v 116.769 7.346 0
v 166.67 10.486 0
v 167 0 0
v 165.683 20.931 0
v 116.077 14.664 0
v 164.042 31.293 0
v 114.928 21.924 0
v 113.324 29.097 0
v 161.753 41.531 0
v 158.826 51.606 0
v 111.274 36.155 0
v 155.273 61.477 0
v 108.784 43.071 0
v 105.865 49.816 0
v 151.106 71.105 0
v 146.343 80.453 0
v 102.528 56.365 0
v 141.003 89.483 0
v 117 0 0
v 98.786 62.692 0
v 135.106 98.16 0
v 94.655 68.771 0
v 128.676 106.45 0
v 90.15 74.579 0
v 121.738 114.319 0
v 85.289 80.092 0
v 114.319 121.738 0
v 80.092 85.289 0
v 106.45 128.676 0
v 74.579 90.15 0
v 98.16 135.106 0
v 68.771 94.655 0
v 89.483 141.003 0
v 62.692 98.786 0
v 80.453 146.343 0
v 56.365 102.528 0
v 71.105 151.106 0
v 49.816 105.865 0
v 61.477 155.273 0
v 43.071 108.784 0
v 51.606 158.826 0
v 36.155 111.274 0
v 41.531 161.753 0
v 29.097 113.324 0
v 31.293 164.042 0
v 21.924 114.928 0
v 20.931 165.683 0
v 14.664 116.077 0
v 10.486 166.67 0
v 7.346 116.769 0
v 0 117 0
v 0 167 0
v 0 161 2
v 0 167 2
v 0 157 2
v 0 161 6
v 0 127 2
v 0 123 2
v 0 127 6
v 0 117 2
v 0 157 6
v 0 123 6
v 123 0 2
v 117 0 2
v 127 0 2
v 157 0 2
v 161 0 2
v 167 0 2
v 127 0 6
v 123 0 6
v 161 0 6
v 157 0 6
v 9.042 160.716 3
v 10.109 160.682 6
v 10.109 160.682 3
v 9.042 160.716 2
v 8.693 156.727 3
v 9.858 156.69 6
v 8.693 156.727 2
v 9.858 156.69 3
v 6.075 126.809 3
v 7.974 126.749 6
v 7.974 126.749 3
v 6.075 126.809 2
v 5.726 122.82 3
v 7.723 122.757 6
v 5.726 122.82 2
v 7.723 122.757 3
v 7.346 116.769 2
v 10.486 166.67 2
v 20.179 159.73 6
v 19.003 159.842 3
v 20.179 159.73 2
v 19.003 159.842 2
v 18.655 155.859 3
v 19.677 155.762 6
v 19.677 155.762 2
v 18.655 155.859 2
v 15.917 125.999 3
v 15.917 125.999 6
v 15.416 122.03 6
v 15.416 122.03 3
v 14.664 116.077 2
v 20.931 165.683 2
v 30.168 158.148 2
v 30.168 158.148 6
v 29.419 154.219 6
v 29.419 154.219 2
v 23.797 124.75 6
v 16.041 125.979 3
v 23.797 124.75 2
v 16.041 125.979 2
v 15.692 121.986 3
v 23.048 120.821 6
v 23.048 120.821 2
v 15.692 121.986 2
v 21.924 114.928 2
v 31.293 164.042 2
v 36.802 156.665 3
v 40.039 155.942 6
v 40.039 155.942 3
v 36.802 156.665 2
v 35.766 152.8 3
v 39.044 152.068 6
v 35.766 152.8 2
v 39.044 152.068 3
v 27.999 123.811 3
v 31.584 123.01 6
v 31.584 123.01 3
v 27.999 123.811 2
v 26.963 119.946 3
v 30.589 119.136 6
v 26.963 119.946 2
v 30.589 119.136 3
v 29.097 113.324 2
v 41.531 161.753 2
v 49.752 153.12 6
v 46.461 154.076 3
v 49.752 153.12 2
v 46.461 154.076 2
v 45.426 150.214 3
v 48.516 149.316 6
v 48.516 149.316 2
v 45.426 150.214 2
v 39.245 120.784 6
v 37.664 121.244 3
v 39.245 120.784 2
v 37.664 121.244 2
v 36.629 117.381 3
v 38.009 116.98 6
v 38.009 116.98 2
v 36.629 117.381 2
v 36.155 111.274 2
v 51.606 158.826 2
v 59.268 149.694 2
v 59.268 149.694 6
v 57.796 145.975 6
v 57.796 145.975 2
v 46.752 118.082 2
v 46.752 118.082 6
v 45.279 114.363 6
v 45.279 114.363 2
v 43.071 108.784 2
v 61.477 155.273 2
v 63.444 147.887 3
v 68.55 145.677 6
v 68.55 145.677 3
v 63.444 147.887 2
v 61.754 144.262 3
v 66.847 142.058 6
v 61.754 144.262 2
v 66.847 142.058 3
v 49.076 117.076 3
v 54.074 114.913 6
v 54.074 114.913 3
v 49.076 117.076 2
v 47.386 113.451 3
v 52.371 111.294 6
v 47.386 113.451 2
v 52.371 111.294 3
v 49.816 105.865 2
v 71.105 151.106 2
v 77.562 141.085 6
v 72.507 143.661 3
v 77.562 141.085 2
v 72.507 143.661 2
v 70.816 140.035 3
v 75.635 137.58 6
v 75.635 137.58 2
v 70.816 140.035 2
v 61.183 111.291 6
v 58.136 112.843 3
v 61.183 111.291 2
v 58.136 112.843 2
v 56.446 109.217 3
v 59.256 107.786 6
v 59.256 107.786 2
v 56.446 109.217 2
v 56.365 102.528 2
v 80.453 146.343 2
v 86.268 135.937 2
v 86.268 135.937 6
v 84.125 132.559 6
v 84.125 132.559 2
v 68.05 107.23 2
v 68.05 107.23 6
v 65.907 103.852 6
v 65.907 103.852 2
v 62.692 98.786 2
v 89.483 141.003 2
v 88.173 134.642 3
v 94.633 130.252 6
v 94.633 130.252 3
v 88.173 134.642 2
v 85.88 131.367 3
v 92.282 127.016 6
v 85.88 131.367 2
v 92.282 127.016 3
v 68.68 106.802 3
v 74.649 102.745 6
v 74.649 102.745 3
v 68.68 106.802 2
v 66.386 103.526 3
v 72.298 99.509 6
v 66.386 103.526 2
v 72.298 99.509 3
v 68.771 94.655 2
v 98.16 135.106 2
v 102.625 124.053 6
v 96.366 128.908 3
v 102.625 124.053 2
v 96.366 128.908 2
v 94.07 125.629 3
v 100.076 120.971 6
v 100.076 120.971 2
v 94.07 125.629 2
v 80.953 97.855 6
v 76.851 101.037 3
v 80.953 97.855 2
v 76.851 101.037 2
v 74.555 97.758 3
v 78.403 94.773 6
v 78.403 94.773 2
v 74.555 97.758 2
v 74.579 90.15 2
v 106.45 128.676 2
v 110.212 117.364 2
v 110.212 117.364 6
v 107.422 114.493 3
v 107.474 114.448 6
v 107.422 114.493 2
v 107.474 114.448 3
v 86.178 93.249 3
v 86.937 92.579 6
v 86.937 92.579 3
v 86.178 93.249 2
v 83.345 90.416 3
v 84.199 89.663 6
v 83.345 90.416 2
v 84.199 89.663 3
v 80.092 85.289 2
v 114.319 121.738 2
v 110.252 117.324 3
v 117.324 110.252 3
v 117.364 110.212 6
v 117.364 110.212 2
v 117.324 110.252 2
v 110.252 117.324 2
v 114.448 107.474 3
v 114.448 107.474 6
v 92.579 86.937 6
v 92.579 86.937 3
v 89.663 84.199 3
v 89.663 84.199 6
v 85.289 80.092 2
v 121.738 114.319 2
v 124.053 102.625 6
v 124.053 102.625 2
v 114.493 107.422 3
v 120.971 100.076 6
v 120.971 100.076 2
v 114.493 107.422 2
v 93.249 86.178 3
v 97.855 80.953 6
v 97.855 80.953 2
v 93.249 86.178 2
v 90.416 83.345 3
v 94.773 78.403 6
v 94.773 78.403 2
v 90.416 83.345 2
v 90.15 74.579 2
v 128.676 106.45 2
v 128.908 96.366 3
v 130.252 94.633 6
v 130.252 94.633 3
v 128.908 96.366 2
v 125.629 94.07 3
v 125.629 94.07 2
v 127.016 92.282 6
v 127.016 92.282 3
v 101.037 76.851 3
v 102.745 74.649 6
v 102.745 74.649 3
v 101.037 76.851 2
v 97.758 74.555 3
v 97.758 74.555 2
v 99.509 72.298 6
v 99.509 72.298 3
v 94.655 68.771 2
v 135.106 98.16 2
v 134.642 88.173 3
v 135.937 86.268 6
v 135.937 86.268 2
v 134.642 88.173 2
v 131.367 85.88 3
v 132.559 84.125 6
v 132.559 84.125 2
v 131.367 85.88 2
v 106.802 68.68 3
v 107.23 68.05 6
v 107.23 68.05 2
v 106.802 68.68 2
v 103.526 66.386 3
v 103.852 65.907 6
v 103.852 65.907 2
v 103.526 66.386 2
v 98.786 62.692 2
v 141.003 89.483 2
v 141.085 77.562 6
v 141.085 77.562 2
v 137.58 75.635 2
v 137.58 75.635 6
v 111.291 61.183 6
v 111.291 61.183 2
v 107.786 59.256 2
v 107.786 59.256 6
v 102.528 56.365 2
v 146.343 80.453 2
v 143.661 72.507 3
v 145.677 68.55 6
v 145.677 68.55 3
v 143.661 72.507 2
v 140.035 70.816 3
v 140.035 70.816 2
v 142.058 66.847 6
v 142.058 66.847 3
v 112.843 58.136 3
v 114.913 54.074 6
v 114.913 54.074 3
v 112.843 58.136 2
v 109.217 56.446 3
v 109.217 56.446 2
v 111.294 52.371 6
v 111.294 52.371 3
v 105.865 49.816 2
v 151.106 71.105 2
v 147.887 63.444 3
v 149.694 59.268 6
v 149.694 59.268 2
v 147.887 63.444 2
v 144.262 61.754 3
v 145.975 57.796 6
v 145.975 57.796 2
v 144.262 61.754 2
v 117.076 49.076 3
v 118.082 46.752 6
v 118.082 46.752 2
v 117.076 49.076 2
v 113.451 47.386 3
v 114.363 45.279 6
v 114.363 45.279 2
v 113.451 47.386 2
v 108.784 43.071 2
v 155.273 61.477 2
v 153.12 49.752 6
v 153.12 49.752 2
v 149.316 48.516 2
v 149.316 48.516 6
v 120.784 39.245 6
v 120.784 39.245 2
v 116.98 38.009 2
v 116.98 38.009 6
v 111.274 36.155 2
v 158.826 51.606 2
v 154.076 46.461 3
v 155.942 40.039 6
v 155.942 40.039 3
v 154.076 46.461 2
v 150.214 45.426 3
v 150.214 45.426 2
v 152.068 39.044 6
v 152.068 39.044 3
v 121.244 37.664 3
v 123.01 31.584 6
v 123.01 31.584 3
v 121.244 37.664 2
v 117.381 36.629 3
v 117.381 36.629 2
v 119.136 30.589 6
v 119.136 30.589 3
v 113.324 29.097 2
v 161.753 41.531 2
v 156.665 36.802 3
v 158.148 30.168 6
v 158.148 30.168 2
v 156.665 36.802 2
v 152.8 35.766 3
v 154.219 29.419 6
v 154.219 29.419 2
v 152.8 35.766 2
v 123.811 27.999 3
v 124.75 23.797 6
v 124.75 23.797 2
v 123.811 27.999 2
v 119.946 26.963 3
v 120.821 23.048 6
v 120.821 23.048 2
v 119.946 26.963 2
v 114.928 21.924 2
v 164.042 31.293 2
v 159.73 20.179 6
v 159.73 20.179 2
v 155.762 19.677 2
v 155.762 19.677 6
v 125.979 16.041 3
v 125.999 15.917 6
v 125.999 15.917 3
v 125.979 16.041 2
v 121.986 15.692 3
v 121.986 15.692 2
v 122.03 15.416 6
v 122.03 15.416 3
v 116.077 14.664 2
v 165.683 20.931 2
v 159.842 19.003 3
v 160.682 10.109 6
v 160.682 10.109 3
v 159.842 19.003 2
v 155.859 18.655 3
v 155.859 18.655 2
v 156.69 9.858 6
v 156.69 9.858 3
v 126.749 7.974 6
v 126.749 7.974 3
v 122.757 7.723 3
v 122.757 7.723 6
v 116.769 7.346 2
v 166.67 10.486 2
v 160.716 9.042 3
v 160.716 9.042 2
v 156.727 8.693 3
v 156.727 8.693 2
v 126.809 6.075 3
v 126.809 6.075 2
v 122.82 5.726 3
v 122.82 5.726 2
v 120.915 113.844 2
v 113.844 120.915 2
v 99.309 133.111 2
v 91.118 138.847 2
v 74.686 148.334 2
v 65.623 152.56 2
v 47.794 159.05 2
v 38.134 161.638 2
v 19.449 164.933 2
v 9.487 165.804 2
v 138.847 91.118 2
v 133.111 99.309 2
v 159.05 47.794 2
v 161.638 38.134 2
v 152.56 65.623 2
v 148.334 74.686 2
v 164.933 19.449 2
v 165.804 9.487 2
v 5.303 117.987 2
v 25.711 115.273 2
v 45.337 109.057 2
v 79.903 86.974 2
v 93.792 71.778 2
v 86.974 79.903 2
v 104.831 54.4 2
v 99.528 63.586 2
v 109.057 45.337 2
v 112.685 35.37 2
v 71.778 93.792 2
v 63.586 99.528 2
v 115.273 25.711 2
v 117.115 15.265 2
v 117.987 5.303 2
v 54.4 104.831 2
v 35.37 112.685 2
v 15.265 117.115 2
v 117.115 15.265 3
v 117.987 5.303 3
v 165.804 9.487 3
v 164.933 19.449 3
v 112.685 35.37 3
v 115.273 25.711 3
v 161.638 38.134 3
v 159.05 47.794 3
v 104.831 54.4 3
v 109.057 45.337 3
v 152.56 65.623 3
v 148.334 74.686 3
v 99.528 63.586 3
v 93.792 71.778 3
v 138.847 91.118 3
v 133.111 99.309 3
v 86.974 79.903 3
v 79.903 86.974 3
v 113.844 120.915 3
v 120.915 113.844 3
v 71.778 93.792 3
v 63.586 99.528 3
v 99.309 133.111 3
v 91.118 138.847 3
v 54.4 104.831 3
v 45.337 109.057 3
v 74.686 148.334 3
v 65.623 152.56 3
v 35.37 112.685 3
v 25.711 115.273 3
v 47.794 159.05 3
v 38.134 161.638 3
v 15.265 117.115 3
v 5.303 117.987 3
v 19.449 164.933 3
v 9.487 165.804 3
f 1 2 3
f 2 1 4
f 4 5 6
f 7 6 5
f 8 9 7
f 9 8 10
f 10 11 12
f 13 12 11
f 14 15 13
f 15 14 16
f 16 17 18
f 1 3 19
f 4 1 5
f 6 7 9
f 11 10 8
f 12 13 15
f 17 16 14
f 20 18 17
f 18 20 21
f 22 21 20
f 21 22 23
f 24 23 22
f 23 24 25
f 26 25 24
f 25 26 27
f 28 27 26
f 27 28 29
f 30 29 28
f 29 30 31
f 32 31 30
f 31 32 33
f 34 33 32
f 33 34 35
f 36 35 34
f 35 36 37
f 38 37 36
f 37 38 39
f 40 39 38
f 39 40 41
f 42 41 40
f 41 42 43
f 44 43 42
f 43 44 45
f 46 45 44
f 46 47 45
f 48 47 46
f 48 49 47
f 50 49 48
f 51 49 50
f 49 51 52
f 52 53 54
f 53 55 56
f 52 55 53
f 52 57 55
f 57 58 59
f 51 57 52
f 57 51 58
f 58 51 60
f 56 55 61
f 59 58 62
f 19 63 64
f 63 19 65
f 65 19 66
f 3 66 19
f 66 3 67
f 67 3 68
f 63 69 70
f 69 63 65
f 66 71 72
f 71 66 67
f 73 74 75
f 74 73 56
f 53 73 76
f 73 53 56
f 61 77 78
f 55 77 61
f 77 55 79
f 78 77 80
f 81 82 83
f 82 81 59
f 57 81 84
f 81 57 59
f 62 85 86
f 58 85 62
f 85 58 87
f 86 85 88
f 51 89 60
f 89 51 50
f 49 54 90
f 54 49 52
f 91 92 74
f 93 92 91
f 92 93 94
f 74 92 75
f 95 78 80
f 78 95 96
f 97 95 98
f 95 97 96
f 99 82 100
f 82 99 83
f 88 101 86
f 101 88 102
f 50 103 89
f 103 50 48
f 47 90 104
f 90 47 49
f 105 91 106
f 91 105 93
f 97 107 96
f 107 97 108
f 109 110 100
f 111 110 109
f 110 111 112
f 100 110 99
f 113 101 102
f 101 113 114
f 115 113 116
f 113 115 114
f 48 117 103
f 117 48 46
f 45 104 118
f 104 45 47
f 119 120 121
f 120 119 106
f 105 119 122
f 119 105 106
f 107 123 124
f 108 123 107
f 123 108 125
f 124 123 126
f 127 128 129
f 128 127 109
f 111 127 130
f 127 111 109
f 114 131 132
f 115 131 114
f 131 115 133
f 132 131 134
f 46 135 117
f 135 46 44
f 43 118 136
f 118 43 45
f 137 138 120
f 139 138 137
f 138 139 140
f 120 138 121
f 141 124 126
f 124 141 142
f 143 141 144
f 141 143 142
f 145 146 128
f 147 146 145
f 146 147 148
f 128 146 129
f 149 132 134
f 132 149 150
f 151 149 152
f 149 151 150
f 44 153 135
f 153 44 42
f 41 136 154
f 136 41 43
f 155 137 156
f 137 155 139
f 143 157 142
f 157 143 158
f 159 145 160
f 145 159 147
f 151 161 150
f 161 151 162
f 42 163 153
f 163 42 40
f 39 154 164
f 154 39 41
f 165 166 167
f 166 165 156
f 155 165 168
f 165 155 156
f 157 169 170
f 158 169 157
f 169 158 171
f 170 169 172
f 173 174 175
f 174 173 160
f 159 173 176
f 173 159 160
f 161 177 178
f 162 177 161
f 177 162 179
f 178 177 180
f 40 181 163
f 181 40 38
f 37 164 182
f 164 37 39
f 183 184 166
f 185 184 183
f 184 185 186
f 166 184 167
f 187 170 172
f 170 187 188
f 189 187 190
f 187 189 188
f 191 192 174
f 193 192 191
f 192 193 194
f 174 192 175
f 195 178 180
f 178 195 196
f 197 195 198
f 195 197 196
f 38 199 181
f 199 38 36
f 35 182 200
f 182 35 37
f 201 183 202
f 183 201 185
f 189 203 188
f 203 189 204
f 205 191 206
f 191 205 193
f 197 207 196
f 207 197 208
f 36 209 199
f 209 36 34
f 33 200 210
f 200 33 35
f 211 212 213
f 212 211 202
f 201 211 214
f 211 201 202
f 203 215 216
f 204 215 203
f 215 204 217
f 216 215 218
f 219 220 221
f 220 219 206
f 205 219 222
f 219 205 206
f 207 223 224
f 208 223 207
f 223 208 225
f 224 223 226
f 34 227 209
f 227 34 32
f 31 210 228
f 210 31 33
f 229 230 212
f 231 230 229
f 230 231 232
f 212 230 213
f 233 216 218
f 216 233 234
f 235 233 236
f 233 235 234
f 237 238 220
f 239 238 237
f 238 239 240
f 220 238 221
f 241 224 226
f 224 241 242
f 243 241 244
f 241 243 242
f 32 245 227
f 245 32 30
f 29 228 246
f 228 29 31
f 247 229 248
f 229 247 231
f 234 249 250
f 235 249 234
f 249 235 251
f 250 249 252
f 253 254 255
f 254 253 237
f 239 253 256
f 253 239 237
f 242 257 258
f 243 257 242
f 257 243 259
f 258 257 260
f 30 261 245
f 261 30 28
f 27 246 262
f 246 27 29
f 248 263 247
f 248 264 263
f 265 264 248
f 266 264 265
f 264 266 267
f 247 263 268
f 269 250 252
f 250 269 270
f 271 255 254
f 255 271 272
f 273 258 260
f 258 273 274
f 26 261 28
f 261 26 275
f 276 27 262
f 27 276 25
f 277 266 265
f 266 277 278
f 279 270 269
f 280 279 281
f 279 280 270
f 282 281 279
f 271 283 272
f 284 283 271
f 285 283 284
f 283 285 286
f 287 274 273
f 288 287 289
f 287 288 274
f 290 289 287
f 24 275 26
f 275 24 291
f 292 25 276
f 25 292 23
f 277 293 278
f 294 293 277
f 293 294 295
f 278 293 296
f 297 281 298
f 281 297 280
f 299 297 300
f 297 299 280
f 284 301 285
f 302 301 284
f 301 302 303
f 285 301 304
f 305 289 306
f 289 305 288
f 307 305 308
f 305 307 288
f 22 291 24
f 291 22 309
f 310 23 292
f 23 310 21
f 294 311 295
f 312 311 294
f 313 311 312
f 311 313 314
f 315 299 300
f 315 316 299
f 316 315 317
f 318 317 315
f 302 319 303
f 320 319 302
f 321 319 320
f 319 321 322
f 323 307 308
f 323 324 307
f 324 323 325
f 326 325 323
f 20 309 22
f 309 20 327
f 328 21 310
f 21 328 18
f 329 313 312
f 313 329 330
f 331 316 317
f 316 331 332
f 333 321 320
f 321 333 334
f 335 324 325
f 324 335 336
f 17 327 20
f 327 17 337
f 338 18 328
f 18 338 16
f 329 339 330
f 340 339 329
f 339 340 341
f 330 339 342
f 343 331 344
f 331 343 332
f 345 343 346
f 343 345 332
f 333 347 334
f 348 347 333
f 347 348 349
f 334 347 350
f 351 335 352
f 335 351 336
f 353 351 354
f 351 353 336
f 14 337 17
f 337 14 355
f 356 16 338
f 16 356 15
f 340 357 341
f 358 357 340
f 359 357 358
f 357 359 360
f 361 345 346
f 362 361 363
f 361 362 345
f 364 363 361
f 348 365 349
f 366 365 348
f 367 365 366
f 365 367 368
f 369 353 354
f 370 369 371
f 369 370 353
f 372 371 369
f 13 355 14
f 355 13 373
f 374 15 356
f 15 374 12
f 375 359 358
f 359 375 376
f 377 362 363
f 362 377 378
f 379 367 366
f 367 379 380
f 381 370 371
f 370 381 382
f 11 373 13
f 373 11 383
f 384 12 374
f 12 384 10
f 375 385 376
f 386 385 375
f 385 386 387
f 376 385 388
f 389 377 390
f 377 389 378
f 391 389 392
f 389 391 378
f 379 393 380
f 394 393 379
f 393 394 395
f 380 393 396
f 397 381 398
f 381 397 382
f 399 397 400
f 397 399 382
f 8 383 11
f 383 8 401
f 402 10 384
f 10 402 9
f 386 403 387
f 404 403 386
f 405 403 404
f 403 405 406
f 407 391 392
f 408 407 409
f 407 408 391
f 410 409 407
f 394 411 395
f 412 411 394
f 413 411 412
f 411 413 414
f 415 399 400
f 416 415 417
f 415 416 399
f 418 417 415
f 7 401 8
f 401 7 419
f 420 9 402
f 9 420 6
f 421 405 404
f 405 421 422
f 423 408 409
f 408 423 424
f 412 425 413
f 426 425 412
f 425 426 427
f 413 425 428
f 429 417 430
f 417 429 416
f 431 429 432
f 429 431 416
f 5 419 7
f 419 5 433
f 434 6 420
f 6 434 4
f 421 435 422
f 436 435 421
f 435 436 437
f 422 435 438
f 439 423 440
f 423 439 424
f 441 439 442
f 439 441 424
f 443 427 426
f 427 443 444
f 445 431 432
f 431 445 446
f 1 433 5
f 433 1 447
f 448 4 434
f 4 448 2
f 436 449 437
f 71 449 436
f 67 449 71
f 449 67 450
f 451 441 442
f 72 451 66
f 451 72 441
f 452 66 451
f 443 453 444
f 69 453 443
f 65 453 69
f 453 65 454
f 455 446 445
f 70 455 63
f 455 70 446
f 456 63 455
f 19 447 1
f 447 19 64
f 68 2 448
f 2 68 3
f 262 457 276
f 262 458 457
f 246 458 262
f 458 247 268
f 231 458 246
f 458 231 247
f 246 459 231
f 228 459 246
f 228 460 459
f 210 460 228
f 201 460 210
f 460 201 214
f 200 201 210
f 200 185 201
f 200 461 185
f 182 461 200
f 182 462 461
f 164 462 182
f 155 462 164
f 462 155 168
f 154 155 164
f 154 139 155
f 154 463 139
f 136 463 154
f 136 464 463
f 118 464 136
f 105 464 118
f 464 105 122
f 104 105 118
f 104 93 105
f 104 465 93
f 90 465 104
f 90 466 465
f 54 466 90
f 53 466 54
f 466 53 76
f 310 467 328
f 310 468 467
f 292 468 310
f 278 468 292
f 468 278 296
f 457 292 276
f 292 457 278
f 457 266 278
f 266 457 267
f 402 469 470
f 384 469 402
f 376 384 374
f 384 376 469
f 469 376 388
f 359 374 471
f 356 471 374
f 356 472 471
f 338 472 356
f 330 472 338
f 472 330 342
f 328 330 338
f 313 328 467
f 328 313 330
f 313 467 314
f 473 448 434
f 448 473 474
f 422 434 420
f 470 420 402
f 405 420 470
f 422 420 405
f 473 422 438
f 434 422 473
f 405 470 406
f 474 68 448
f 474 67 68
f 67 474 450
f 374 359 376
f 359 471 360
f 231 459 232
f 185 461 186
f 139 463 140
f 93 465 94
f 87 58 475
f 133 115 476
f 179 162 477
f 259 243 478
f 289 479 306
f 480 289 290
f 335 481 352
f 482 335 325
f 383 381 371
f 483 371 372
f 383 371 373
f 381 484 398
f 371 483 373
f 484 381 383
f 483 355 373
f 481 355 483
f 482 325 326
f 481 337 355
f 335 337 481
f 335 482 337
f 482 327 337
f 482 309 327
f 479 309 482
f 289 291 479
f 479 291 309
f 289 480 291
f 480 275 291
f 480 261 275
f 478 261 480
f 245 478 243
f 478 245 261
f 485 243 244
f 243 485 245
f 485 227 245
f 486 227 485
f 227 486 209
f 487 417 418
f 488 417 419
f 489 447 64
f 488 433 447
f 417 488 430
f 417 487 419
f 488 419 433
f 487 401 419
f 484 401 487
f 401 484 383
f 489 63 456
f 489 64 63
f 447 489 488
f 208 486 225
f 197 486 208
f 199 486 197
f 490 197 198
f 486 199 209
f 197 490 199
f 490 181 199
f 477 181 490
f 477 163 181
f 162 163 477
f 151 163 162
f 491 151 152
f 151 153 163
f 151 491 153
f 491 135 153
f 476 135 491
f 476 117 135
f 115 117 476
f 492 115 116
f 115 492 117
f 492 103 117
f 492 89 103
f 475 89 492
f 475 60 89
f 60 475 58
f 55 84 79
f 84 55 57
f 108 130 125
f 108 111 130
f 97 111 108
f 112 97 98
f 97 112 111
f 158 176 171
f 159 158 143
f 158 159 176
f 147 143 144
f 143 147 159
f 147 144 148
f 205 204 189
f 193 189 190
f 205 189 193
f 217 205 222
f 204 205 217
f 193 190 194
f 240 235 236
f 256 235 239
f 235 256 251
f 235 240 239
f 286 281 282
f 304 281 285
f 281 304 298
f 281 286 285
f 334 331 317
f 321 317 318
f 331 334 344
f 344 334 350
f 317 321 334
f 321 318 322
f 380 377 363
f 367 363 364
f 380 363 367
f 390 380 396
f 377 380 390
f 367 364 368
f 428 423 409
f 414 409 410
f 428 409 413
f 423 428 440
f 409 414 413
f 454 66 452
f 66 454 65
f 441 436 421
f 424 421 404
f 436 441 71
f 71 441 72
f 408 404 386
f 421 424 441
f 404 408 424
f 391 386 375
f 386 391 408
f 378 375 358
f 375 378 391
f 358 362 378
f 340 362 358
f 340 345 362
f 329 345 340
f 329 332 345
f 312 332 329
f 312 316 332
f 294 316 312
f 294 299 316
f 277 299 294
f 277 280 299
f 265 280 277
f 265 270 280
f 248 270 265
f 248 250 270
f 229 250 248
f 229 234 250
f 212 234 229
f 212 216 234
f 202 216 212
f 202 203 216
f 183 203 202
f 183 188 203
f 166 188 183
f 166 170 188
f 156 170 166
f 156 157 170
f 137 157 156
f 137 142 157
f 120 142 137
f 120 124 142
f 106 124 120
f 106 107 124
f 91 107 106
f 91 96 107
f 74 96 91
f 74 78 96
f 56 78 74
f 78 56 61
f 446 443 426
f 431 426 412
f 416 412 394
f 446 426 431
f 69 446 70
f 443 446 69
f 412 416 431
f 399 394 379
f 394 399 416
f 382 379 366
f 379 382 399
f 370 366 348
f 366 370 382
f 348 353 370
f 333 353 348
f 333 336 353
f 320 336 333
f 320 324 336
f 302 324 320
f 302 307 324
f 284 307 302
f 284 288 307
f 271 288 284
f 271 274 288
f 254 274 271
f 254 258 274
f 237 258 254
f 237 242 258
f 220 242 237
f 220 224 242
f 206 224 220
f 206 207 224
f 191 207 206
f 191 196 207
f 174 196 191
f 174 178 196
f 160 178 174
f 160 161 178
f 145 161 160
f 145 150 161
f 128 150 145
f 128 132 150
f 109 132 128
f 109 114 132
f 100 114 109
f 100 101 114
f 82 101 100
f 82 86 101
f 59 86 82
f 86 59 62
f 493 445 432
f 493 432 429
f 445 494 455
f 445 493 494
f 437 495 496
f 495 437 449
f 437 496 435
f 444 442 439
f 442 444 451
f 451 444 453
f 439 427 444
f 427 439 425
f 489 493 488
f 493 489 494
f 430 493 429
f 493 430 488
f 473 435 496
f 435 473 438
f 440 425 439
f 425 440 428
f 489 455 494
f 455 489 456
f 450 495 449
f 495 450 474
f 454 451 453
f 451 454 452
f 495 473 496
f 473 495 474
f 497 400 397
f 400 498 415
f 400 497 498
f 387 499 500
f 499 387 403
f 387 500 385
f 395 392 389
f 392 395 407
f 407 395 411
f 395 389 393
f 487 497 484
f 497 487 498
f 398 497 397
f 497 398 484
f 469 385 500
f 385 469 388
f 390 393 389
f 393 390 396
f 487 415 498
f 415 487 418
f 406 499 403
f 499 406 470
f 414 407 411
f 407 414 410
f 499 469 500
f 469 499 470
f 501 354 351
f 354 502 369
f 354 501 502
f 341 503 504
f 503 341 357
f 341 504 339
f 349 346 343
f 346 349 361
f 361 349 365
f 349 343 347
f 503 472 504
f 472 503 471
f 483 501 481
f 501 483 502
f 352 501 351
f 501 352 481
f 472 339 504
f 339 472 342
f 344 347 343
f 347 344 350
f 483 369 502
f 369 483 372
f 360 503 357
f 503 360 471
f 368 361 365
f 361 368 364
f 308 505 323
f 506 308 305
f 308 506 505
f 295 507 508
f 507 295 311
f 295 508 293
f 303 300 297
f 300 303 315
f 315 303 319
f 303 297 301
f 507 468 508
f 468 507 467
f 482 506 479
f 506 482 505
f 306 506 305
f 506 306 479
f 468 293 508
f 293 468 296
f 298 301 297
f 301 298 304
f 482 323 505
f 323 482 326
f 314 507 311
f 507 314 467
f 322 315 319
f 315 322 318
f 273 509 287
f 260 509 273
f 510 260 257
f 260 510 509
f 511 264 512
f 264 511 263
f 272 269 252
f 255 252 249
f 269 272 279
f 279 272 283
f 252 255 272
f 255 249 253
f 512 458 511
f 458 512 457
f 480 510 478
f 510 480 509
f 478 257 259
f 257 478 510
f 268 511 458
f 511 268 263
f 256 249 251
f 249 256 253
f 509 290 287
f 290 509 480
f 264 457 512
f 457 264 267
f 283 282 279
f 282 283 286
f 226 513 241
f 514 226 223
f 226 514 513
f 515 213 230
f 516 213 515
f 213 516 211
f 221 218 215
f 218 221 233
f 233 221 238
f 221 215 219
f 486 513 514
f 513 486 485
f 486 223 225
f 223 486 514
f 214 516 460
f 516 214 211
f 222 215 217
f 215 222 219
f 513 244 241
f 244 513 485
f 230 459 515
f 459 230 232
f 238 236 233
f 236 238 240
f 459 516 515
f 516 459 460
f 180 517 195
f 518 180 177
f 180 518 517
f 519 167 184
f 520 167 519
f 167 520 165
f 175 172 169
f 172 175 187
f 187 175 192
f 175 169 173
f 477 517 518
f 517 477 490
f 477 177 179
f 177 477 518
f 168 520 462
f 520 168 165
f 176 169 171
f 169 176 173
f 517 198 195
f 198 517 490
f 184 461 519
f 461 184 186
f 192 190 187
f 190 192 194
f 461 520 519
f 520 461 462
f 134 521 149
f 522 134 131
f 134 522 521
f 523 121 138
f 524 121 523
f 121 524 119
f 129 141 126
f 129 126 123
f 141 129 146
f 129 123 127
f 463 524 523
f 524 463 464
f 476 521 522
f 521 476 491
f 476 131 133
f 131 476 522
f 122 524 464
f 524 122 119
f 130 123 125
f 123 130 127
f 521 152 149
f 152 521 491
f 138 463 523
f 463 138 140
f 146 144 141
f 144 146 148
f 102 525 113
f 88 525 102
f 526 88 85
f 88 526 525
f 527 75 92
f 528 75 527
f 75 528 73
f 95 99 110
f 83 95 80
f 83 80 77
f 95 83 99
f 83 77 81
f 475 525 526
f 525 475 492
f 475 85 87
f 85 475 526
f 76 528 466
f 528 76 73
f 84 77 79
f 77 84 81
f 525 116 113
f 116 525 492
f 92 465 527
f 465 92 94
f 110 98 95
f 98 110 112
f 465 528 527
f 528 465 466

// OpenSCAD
intersection() {
	// un "cube" qui permettra de couper le rail extrud.. .. un quart de cercle
	cube(size = [174, 174, 20], center = false);
	// extrusion rotative d'un profil de rail d..fini par un polygon
   translate([0,0,-7])
	rotate_extrude(convexity= 10, $fn = 100)
		translate([142,0,0])

//		polygon(points=[[0,7],[-25,7],[-30,0],[-32,0],[-25,9],[-19,9],[-19,13],[-15,13],[-15,9],[15,9],[15,13],[19,13],[19,9],[25,9],[32,0],[30,0],[25,7]], paths=[[0,1,2,3,4,5,6,7,8,9,10,11,12,13,14,15,16,17,18,19,20]]);

		polygon(points=[[0,7],[-25,7],[-25,9],[-19,9],[-19,13],[-15,13],[-15,9],[15,9],[15,13],[19,13],[19,9],[25,9],[25,7]], paths=[[0,1,2,3,4,5,6,7,8,9,10,11,12,13,14,15,16,17,18,19,20]]);

}

// traverses
for (a = [5,15,25,35,45,55,65,75,85]) // n iterations
{
	rotate([0,0,a])
	translate([118, -5, 2])
	cube(size = [48, 10, 1], center = false);
}

/*
for (a = [5,25,45,65,85]) // n iterations
{
	rotate([0,0,a])
	translate([142,0,0])
	rotate([90,0,0])
	linear_extrude(height=2.5)
		polygon(points=[[-32,0],[-25,9],[25,9],[32,0]], paths=[[0,1,2,3,4,5,6,7,8,9,10,11,12,13,14,15,16,17,18,19,20]]);
}
*/

/*
		polygon(points=[[0,7],[-25,7],[-30,0],[-32,0],[-25,9],[-19,9],[-19,13],[-15,13],[-15,9],[15,9],[15,13],[19,13],[19,9],[25,9],[32,0],[30,0],[25,7]], paths=[[0,1,2,3,4,5,6,7,8,9,10,11,12,13,14,15,16,17,18,19,20]]);
*/
